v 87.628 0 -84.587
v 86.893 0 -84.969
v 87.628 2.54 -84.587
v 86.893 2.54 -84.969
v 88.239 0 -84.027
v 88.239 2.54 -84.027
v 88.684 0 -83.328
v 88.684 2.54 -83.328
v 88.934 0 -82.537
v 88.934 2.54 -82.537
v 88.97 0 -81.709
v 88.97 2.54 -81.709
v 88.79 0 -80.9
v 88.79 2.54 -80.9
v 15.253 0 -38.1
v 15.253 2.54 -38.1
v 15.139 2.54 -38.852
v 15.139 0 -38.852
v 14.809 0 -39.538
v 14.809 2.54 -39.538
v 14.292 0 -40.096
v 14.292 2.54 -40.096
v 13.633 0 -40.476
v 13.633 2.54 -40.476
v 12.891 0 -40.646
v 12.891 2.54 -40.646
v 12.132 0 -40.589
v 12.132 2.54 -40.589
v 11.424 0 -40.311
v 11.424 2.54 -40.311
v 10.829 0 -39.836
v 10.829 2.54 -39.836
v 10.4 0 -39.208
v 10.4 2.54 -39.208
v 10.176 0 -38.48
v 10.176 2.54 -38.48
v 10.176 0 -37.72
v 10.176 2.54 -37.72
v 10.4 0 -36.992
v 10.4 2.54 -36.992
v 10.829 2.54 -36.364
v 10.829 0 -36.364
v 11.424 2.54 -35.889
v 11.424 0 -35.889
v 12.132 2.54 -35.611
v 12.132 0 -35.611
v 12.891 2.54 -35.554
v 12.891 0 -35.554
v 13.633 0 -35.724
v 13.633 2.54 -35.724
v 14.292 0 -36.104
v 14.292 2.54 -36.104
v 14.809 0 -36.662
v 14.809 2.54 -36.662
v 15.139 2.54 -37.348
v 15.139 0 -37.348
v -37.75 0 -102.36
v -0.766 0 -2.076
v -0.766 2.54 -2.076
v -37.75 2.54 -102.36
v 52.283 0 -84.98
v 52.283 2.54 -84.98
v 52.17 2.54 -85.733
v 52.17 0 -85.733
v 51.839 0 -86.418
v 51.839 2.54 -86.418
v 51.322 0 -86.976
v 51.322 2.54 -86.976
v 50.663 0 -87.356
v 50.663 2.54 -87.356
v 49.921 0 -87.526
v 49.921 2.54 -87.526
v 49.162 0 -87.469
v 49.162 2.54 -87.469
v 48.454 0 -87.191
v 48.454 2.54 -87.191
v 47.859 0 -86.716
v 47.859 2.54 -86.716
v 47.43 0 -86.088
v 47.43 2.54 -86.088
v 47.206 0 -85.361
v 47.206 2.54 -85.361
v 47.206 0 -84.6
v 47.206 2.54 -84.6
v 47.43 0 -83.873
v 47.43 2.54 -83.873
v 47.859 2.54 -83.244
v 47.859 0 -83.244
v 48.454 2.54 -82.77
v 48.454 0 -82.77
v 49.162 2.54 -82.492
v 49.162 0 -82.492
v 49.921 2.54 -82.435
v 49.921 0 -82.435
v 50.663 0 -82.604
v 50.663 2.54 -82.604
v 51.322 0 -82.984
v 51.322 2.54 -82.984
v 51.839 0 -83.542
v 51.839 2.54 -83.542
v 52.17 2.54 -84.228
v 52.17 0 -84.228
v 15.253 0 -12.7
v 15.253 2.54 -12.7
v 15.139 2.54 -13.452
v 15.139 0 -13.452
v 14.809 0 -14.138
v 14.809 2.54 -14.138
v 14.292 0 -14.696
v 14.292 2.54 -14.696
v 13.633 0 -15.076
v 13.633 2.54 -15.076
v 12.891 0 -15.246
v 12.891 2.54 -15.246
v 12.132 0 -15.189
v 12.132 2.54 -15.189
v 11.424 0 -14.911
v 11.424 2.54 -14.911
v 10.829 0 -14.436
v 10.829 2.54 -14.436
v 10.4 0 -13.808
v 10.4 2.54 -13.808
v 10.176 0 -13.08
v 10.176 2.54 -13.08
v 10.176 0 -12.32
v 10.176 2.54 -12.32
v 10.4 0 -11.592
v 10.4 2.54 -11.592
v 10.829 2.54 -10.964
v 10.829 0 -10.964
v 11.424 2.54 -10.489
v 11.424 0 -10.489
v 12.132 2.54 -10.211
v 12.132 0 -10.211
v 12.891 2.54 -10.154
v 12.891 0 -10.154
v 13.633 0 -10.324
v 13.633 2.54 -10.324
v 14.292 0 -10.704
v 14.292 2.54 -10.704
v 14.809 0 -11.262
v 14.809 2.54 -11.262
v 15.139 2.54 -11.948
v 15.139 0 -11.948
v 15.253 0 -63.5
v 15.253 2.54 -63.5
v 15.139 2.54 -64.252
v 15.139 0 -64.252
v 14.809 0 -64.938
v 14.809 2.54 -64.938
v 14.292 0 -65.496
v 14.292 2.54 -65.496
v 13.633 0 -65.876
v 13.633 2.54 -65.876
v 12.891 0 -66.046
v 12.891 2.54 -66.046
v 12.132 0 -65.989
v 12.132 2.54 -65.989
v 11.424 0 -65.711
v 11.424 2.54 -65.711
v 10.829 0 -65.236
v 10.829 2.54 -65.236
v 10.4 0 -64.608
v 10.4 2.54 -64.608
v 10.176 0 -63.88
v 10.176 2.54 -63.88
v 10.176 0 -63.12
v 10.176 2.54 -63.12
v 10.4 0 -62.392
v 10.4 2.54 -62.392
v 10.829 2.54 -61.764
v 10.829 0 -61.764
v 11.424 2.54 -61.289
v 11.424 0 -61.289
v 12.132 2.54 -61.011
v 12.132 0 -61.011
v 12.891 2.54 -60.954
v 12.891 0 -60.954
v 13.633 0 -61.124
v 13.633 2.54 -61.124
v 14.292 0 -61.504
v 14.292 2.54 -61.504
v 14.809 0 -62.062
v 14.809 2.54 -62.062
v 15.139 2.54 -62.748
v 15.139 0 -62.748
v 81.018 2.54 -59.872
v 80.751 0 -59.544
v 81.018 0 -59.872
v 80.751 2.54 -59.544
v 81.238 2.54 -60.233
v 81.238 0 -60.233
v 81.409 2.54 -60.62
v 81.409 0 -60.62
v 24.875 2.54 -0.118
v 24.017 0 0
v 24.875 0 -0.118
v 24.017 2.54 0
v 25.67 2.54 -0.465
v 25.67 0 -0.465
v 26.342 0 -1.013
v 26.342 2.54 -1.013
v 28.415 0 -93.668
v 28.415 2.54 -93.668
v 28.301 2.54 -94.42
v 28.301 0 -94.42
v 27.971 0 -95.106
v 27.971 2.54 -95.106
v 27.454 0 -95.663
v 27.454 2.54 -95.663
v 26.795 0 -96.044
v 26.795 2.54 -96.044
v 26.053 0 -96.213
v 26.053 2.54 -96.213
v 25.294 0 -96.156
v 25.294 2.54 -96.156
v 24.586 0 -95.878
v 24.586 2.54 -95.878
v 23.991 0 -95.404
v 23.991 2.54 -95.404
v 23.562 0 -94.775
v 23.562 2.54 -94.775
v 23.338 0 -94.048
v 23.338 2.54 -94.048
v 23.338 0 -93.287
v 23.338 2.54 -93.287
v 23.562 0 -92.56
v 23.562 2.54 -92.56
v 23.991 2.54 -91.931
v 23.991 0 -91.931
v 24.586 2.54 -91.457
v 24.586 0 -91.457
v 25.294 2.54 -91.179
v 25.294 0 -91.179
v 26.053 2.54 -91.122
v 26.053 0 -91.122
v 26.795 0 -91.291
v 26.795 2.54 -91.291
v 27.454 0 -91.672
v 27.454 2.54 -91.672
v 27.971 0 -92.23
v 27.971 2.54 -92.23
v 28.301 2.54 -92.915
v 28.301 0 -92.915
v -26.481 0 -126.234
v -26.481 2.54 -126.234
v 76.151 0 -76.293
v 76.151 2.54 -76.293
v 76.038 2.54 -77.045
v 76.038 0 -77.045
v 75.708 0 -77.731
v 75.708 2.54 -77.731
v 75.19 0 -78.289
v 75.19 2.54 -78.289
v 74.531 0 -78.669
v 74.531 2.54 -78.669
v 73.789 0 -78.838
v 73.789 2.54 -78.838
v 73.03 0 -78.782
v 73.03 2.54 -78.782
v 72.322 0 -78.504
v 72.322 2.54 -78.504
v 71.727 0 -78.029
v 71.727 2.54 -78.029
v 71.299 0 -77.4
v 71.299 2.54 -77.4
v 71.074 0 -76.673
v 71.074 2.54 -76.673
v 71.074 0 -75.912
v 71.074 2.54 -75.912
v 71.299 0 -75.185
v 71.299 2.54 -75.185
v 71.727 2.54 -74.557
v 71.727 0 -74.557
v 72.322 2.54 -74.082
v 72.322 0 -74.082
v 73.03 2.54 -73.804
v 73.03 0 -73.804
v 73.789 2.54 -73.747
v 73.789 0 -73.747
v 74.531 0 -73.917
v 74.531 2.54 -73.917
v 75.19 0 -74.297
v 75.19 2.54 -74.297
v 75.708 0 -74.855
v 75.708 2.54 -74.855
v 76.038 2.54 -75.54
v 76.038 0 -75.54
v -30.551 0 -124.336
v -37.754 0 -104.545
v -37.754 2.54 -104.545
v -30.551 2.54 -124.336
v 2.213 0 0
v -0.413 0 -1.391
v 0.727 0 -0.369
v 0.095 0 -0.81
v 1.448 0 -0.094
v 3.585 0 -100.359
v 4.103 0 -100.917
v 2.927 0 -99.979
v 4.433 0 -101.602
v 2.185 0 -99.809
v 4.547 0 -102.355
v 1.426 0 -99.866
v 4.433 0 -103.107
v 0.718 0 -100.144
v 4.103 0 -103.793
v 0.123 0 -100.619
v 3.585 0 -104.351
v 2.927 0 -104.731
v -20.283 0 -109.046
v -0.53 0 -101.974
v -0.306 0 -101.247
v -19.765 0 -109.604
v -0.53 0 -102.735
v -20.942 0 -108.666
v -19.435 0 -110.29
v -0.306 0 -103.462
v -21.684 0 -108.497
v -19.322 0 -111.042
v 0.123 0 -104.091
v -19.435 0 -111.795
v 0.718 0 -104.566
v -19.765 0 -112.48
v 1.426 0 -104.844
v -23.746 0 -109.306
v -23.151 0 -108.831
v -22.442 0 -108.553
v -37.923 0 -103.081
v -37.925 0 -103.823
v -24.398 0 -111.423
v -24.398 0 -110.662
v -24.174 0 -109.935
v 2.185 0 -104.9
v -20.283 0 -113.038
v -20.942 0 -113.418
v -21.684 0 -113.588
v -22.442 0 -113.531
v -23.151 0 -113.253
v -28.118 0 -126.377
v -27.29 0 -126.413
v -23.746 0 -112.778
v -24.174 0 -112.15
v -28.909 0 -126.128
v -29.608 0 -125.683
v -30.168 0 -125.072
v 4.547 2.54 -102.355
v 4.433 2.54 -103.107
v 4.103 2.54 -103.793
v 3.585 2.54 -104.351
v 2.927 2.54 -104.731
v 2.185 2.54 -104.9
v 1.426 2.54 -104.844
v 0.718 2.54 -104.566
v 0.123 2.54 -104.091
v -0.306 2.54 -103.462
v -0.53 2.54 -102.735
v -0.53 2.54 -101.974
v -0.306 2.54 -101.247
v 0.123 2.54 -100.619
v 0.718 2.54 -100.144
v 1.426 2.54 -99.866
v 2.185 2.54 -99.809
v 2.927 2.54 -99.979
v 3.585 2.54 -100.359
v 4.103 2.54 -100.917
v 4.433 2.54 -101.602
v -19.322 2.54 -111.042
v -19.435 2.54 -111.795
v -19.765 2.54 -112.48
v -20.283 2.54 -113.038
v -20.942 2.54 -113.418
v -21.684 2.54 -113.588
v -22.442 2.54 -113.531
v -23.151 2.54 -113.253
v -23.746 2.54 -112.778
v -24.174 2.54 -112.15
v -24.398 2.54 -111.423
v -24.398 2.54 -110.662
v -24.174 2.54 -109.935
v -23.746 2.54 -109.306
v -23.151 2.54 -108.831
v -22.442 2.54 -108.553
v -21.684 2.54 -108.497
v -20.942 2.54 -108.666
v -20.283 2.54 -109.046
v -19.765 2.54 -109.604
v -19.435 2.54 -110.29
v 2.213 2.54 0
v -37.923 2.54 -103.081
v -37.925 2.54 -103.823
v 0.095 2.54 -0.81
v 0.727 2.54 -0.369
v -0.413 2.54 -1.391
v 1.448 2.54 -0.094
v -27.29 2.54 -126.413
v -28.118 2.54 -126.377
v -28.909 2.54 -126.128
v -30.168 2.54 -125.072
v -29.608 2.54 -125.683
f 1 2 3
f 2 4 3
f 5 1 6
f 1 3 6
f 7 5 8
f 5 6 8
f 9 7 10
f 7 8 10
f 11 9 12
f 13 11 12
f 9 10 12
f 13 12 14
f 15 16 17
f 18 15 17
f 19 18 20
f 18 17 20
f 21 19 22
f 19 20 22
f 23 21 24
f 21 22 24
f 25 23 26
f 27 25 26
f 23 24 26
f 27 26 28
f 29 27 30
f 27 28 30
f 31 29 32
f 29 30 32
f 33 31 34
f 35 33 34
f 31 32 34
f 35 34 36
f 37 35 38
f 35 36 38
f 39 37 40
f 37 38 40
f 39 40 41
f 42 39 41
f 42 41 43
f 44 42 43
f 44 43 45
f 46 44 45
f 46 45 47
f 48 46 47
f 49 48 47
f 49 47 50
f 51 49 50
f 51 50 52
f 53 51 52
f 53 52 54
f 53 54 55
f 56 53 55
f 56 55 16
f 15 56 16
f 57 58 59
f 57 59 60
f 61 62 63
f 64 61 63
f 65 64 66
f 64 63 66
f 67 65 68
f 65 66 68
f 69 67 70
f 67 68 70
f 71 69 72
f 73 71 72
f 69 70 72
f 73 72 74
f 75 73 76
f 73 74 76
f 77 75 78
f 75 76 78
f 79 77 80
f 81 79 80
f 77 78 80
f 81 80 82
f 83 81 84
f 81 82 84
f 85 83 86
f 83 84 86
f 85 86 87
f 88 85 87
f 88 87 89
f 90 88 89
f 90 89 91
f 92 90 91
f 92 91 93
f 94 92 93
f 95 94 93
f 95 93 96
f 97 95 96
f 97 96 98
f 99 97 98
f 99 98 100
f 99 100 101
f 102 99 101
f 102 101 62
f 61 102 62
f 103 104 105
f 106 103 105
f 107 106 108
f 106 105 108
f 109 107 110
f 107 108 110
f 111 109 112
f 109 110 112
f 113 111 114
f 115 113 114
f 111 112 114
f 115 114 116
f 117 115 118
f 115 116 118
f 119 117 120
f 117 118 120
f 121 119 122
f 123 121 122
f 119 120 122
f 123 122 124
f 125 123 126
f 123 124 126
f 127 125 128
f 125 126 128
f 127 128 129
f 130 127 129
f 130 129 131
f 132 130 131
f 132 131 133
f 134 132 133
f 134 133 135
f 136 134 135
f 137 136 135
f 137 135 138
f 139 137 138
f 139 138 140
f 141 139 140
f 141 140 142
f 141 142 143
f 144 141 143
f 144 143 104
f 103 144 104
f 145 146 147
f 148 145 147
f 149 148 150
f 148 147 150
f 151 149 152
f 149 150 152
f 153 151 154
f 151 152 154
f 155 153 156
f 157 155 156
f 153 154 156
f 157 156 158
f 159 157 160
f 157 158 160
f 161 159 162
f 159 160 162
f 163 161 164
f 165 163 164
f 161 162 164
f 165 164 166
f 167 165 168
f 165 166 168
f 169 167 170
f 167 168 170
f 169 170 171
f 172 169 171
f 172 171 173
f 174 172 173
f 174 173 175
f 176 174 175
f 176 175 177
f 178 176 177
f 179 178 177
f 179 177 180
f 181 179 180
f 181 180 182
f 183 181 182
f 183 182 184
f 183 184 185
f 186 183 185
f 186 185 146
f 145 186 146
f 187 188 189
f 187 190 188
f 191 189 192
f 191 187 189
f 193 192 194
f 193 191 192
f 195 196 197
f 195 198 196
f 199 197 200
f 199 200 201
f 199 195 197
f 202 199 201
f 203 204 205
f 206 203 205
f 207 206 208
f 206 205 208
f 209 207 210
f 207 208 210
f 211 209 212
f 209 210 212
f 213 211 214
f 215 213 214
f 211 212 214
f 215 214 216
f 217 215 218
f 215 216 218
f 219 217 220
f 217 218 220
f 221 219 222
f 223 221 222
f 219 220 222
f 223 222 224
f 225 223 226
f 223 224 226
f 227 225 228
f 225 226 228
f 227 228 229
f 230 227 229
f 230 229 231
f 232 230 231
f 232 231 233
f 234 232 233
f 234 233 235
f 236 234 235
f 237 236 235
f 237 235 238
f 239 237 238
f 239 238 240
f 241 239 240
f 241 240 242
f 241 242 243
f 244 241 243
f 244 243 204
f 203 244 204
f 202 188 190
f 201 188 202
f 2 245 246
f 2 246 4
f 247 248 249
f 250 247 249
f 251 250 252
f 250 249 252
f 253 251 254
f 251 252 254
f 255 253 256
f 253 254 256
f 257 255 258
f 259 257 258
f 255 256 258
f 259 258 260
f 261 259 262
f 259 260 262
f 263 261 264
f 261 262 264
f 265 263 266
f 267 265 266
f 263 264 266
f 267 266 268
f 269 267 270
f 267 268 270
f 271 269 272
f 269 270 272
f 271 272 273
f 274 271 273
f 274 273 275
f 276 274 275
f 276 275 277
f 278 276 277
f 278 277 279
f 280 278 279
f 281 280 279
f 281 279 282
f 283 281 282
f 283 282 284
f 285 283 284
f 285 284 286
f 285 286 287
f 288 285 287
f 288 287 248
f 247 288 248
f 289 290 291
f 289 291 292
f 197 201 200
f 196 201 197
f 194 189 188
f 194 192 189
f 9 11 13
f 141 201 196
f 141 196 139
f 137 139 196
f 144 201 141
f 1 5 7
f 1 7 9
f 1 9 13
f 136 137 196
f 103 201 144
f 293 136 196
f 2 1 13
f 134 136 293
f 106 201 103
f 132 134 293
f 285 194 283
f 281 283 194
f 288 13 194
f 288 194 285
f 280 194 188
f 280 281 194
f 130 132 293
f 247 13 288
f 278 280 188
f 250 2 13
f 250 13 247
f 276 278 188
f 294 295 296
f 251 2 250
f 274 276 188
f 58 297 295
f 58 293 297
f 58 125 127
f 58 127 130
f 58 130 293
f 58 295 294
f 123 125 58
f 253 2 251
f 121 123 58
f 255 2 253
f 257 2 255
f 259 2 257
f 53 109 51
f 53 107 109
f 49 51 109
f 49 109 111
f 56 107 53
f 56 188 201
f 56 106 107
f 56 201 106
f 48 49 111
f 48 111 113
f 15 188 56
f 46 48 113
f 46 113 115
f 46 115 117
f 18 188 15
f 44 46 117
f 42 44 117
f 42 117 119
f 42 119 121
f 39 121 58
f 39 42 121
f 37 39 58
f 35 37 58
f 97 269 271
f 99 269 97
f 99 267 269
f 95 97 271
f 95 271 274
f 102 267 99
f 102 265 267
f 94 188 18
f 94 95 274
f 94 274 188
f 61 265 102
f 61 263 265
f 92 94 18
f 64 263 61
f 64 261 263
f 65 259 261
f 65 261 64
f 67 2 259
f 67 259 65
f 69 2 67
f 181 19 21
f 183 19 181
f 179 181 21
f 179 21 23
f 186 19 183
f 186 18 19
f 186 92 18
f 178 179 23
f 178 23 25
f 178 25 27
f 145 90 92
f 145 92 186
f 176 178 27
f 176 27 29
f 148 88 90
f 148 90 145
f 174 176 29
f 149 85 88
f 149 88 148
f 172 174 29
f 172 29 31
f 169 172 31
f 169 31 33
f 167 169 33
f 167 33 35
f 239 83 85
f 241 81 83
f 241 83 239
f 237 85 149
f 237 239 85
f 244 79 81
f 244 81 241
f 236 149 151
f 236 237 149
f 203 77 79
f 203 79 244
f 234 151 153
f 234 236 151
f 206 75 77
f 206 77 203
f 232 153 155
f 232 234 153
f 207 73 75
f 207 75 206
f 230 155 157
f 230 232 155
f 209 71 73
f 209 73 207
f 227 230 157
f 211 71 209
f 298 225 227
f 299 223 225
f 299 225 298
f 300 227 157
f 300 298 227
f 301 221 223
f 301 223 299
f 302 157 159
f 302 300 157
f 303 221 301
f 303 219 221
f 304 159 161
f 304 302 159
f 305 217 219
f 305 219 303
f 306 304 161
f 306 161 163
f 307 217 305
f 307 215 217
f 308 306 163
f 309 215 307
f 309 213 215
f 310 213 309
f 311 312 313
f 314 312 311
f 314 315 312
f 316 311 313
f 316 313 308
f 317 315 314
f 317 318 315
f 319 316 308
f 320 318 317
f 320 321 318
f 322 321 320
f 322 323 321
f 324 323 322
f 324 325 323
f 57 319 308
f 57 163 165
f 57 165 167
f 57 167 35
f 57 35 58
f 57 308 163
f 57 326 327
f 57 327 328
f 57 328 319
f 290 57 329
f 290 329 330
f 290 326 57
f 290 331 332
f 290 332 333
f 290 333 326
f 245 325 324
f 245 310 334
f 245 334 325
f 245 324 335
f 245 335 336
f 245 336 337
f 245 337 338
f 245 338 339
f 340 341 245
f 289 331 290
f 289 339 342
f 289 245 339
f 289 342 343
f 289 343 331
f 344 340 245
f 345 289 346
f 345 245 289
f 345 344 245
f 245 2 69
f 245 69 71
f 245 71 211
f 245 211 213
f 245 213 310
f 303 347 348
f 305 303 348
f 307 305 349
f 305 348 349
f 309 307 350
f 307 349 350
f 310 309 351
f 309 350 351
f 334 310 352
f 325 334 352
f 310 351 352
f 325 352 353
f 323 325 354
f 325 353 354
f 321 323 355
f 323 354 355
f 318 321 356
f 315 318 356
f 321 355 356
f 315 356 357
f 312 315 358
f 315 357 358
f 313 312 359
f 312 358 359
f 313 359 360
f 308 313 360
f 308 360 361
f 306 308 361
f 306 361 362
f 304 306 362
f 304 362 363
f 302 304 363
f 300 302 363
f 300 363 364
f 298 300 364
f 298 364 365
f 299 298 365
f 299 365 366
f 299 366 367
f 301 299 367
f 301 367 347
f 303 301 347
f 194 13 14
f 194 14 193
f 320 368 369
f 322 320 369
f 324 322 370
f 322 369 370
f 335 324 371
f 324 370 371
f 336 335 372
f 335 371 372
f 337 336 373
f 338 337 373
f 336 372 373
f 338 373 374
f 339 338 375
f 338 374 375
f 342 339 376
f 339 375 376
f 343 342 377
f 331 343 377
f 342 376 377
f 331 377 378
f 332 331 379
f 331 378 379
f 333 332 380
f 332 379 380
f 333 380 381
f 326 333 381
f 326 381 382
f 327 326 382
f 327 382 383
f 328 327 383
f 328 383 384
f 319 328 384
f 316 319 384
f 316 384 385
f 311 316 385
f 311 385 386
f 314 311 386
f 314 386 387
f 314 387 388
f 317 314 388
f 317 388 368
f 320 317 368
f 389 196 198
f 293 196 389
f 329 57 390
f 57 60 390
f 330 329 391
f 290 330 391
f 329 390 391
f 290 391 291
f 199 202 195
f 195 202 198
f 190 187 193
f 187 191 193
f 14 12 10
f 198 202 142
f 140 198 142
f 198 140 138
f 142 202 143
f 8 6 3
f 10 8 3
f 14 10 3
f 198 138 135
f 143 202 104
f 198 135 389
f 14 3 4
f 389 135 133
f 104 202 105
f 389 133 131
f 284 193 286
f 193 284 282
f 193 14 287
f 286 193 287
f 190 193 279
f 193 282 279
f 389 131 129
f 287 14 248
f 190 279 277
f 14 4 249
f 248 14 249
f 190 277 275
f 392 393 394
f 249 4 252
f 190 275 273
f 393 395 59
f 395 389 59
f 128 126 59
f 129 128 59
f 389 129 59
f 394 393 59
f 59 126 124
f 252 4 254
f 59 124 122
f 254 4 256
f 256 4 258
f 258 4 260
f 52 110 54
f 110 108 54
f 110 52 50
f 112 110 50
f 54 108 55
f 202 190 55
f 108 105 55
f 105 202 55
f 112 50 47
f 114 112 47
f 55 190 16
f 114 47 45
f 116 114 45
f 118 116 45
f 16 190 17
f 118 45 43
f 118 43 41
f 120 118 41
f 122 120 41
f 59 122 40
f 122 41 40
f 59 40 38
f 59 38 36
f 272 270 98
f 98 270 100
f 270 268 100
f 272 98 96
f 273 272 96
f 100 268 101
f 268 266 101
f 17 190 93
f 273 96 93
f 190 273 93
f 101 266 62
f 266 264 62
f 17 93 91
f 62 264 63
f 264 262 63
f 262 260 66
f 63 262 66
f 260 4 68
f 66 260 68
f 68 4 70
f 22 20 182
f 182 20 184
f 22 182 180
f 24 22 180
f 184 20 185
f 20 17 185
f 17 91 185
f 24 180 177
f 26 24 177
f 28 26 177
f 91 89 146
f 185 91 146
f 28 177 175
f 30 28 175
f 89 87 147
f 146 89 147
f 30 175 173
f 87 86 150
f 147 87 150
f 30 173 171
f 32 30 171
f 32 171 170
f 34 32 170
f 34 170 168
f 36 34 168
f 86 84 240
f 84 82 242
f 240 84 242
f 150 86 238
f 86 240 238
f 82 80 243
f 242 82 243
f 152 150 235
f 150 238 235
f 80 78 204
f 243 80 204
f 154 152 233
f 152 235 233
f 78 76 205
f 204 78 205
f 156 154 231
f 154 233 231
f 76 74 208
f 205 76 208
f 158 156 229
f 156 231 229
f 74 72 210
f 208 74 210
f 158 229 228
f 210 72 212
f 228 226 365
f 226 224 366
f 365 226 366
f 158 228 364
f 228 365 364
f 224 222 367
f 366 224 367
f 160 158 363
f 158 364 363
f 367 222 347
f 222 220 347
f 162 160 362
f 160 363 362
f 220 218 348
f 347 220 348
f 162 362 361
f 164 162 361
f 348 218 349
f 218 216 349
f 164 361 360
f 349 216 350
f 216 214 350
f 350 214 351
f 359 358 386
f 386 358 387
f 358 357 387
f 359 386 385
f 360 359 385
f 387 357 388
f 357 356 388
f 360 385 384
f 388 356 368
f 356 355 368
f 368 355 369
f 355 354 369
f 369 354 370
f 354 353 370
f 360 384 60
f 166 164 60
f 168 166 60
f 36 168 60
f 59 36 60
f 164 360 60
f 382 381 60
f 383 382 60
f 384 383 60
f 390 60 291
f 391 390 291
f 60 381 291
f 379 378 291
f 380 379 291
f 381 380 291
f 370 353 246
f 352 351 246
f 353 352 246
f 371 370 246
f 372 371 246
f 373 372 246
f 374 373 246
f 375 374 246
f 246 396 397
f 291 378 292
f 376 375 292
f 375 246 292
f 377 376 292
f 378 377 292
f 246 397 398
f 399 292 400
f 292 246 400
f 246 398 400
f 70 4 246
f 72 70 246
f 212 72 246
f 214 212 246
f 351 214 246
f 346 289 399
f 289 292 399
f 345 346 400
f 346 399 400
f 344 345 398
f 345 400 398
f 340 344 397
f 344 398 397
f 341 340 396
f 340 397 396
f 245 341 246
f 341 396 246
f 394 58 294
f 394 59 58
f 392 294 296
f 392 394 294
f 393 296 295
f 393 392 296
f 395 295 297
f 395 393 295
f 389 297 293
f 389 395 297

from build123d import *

# Parameters (mm, degrees)
BOSS_EXTRUDE1_DEPTH        = 2.54
F_7_0_201_DIAMETER_HOLE1_D = 5.1054
FILLET1_R                  = 3.175


with BuildPart() as part:
    # Sketch1 → Boss-Extrude1 (new body)
    with BuildSketch(Plane(origin=(0, 0, 0), x_dir=(1, 0, 0), z_dir=(0, 1, 0))):
        Polygon((0, 0), (-38.15203444, 103.451714303), (-29.4647228, 127.319906871), (89.87624004, 83.883348669), (81.1889284, 60.015156101), (25.4, 0), align=None)
    extrude(amount=BOSS_EXTRUDE1_DEPTH)

    # #7 (0.201) Diameter Hole1 (through all)
    with Locations(Plane(origin=(0, 0, 0), x_dir=(-1, 0, 0), z_dir=(0, -1, 0))):
        with Locations((-73.598487936, 76.292908205), (-49.730295368, 84.980219846), (-25.8621028, 93.667531486), (-1.993910232, 102.354843126), (21.874282336, 111.042154767), (-12.7, 63.5), (-12.7, 38.1), (-12.7, 12.7)):
            Hole(F_7_0_201_DIAMETER_HOLE1_D / 2)

    # Fillet1
    fillet1_edges = [part.edges().sort_by_distance(p)[0] for p in [
        (0, 1.27, 0),
        (-38.15203444, 1.27, -103.451714303),
        (-29.4647228, 1.27, -127.319906871),
        (89.87624004, 1.27, -83.883348669),
        (81.1889284, 1.27, -60.015156101),
        (25.4, 1.27, 0),
    ]]
    fillet(fillet1_edges, radius=FILLET1_R)


solid = part.part
